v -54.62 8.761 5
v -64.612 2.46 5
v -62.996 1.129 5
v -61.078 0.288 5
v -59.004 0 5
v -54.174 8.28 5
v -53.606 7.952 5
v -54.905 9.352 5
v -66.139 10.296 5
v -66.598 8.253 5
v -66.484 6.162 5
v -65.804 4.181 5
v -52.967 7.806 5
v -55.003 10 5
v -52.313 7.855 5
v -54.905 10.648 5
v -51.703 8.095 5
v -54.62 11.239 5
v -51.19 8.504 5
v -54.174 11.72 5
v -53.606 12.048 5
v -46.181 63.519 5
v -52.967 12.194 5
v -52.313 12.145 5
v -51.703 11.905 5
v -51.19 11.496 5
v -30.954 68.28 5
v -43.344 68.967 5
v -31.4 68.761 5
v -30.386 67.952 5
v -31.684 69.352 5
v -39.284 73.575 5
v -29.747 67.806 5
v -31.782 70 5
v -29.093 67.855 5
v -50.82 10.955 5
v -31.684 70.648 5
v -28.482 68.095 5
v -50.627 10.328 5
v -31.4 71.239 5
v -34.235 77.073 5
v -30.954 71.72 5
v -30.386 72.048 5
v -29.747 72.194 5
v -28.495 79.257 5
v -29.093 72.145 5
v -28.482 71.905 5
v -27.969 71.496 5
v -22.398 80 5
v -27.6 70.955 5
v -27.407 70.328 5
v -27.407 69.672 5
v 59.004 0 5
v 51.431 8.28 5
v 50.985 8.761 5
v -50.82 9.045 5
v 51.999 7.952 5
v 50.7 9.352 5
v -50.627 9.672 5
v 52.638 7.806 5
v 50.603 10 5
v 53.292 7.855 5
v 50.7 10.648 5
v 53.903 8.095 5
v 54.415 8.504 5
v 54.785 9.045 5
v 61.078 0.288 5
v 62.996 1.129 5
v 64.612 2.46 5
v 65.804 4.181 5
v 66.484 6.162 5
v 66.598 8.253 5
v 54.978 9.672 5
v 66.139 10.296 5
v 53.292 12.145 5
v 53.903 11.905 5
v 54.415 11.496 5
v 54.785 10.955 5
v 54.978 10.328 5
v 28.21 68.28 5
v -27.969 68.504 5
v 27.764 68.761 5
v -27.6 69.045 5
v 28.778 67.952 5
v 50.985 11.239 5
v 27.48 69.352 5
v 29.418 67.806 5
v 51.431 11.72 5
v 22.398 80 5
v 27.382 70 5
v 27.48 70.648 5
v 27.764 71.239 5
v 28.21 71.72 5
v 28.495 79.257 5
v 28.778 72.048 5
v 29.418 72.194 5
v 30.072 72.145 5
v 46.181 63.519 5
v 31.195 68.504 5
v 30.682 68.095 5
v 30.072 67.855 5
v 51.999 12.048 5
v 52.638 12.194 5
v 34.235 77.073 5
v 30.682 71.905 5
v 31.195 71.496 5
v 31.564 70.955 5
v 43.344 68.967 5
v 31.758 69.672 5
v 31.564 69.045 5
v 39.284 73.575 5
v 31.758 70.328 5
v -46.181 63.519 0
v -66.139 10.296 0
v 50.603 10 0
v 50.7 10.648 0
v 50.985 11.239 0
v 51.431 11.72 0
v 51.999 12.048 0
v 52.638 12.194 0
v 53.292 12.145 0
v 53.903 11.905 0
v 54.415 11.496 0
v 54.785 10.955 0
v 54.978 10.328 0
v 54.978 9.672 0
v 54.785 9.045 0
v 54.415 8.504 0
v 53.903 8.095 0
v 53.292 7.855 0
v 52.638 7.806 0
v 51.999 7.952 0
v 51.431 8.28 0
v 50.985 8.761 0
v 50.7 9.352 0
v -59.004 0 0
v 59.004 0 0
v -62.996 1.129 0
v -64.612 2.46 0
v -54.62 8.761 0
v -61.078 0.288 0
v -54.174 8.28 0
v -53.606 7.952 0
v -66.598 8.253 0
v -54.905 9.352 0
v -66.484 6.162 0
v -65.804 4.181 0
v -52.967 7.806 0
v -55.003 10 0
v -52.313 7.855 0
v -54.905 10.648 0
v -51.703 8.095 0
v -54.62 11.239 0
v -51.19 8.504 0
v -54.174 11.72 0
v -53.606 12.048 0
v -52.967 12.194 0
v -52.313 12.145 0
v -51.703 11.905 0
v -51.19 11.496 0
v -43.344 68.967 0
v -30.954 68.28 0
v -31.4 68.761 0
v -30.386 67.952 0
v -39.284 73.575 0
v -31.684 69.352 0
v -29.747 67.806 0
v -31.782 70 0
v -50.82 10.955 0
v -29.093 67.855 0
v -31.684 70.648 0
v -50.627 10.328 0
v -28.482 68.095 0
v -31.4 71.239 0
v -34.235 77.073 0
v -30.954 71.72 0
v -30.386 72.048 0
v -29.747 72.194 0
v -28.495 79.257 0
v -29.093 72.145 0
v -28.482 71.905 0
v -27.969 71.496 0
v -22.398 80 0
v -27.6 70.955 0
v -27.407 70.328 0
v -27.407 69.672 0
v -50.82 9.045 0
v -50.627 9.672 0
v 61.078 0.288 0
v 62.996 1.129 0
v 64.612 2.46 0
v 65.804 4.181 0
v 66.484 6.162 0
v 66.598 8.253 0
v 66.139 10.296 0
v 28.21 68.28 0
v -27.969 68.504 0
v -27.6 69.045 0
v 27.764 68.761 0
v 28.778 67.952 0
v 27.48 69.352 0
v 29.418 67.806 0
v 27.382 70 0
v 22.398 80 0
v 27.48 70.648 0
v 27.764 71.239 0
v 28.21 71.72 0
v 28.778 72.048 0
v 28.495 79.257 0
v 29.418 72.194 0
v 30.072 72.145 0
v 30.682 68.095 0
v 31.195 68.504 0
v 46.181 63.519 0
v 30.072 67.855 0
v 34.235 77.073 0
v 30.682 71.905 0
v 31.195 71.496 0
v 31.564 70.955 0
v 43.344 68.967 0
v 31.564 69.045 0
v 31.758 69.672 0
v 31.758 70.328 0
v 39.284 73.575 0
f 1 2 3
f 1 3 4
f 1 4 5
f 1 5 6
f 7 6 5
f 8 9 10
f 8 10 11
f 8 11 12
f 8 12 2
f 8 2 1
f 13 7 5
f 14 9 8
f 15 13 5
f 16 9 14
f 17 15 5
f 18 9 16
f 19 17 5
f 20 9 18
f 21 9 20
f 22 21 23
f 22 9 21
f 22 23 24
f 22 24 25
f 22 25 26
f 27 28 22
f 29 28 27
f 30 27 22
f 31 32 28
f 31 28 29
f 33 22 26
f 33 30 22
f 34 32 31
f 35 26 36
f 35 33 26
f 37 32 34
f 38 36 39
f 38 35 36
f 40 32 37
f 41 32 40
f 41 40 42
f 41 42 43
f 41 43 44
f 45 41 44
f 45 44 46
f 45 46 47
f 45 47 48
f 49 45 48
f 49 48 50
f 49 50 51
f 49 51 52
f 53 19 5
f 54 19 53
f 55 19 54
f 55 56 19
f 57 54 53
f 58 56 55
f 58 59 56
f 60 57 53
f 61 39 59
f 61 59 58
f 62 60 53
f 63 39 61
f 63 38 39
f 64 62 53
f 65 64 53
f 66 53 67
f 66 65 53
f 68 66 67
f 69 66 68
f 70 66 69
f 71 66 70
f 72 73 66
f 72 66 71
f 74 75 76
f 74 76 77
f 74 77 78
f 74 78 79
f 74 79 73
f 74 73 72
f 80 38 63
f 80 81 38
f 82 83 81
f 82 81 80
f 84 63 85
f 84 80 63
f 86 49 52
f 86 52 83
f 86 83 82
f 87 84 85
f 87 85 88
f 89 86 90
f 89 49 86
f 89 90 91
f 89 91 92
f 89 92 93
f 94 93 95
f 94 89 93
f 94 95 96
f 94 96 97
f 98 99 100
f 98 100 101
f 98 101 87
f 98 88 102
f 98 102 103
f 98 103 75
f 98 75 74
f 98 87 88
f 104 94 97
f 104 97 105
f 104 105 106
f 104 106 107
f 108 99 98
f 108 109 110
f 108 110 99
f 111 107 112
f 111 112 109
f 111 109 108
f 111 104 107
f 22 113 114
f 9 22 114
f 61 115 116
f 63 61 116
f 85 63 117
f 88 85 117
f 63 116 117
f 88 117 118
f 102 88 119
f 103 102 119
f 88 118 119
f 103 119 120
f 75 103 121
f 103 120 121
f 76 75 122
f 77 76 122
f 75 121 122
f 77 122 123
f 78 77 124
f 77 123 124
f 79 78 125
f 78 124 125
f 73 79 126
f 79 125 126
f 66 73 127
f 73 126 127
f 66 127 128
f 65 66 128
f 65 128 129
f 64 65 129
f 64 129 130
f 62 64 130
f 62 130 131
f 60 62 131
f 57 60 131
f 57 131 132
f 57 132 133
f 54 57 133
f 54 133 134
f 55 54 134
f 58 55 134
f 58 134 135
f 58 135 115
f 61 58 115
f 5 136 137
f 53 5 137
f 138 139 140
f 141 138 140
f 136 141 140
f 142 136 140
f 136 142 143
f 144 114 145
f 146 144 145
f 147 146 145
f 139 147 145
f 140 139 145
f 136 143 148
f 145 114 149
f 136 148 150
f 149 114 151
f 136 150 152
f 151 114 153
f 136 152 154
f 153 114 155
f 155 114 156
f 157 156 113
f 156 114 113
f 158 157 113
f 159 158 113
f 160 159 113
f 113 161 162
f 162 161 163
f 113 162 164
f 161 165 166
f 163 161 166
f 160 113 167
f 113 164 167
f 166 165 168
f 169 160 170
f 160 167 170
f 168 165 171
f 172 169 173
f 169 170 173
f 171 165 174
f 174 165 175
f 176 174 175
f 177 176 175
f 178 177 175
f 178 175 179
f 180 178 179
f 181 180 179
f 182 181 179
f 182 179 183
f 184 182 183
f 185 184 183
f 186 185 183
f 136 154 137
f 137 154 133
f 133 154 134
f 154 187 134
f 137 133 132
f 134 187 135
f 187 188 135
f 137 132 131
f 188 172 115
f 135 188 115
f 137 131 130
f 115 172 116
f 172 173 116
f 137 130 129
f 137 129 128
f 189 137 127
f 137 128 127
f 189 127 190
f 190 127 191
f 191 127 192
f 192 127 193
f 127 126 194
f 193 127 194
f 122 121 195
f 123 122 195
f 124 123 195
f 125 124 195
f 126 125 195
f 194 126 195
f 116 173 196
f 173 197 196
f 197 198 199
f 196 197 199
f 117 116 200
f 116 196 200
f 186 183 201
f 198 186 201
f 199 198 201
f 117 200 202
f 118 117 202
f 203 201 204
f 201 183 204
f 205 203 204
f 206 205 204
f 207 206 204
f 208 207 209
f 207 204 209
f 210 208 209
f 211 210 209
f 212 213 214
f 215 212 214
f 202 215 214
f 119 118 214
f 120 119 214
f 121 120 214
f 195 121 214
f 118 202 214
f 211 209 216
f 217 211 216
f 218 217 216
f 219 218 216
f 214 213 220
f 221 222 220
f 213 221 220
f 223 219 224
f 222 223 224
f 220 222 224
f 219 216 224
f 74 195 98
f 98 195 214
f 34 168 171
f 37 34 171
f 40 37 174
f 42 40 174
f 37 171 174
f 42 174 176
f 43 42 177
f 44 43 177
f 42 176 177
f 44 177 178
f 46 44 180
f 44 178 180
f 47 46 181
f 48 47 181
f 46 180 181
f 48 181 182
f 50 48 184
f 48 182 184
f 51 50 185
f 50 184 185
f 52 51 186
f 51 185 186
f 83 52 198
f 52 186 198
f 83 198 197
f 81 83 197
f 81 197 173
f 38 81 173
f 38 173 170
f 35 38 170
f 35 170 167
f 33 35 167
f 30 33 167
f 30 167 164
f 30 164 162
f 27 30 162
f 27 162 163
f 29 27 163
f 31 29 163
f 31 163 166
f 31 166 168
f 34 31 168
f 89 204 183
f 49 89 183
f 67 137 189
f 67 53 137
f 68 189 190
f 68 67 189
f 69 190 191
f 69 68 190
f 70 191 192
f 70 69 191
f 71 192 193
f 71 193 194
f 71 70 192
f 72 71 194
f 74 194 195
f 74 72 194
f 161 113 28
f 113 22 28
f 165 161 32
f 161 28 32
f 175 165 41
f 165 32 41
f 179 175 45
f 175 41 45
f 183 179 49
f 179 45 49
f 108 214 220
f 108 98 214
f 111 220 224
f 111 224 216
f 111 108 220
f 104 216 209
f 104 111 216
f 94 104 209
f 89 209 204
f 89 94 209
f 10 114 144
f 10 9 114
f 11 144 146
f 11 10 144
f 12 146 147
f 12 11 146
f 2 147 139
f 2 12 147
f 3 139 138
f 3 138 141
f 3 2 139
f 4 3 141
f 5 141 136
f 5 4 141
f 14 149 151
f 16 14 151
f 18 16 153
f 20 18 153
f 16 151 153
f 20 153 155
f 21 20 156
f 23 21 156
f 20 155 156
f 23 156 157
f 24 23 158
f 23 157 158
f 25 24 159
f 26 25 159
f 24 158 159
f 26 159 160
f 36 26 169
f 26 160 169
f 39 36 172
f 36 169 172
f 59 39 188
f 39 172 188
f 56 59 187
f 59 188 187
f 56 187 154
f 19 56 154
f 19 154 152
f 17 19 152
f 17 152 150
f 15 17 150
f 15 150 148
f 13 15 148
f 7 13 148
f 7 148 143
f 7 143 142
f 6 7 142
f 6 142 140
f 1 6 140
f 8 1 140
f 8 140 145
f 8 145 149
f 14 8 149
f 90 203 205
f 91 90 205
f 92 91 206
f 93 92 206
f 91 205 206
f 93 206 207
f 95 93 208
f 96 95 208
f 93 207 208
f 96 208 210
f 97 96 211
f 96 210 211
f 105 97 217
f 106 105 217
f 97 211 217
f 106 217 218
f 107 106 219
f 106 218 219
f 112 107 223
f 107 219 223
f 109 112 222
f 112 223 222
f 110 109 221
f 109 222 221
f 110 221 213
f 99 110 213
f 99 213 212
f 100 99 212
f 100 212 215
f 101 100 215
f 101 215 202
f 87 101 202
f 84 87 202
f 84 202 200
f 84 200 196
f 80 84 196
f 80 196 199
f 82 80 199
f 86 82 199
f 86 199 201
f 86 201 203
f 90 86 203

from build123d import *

# Parameters (mm, degrees)
F1_DEPTH = 5
F2_R     = 25.4
F3_R     = 7.62
F5_D     = 4.4


with BuildPart() as f1:
    # F0 (on Top) → F1 (new body)
    with BuildSketch(Plane.XY):
        Polygon((-40, 80), (-70, 0), (70, 0), (40, 80), align=None)
    extrude(amount=F1_DEPTH)

    # F2
    f2_edges = [f1.edges().sort_by_distance(p)[0] for p in [
        (-40, 80, 2.5),
        (40, 80, 2.5),
    ]]
    fillet(f2_edges, radius=F2_R)

    # F3
    f3_edges = [f1.edges().sort_by_distance(p)[0] for p in [
        (-70, 0, 2.5),
        (70, 0, 2.5),
    ]]
    fillet(f3_edges, radius=F3_R)

    # F5 (through all)
    with Locations(Plane.XY.offset(5)):
        with Locations((-29.5821707696, 70), (29.5821707696, 70), (52.8025653534, 10), (-52.8025653534, 10)):
            Hole(F5_D / 2)


solid = f1.part
